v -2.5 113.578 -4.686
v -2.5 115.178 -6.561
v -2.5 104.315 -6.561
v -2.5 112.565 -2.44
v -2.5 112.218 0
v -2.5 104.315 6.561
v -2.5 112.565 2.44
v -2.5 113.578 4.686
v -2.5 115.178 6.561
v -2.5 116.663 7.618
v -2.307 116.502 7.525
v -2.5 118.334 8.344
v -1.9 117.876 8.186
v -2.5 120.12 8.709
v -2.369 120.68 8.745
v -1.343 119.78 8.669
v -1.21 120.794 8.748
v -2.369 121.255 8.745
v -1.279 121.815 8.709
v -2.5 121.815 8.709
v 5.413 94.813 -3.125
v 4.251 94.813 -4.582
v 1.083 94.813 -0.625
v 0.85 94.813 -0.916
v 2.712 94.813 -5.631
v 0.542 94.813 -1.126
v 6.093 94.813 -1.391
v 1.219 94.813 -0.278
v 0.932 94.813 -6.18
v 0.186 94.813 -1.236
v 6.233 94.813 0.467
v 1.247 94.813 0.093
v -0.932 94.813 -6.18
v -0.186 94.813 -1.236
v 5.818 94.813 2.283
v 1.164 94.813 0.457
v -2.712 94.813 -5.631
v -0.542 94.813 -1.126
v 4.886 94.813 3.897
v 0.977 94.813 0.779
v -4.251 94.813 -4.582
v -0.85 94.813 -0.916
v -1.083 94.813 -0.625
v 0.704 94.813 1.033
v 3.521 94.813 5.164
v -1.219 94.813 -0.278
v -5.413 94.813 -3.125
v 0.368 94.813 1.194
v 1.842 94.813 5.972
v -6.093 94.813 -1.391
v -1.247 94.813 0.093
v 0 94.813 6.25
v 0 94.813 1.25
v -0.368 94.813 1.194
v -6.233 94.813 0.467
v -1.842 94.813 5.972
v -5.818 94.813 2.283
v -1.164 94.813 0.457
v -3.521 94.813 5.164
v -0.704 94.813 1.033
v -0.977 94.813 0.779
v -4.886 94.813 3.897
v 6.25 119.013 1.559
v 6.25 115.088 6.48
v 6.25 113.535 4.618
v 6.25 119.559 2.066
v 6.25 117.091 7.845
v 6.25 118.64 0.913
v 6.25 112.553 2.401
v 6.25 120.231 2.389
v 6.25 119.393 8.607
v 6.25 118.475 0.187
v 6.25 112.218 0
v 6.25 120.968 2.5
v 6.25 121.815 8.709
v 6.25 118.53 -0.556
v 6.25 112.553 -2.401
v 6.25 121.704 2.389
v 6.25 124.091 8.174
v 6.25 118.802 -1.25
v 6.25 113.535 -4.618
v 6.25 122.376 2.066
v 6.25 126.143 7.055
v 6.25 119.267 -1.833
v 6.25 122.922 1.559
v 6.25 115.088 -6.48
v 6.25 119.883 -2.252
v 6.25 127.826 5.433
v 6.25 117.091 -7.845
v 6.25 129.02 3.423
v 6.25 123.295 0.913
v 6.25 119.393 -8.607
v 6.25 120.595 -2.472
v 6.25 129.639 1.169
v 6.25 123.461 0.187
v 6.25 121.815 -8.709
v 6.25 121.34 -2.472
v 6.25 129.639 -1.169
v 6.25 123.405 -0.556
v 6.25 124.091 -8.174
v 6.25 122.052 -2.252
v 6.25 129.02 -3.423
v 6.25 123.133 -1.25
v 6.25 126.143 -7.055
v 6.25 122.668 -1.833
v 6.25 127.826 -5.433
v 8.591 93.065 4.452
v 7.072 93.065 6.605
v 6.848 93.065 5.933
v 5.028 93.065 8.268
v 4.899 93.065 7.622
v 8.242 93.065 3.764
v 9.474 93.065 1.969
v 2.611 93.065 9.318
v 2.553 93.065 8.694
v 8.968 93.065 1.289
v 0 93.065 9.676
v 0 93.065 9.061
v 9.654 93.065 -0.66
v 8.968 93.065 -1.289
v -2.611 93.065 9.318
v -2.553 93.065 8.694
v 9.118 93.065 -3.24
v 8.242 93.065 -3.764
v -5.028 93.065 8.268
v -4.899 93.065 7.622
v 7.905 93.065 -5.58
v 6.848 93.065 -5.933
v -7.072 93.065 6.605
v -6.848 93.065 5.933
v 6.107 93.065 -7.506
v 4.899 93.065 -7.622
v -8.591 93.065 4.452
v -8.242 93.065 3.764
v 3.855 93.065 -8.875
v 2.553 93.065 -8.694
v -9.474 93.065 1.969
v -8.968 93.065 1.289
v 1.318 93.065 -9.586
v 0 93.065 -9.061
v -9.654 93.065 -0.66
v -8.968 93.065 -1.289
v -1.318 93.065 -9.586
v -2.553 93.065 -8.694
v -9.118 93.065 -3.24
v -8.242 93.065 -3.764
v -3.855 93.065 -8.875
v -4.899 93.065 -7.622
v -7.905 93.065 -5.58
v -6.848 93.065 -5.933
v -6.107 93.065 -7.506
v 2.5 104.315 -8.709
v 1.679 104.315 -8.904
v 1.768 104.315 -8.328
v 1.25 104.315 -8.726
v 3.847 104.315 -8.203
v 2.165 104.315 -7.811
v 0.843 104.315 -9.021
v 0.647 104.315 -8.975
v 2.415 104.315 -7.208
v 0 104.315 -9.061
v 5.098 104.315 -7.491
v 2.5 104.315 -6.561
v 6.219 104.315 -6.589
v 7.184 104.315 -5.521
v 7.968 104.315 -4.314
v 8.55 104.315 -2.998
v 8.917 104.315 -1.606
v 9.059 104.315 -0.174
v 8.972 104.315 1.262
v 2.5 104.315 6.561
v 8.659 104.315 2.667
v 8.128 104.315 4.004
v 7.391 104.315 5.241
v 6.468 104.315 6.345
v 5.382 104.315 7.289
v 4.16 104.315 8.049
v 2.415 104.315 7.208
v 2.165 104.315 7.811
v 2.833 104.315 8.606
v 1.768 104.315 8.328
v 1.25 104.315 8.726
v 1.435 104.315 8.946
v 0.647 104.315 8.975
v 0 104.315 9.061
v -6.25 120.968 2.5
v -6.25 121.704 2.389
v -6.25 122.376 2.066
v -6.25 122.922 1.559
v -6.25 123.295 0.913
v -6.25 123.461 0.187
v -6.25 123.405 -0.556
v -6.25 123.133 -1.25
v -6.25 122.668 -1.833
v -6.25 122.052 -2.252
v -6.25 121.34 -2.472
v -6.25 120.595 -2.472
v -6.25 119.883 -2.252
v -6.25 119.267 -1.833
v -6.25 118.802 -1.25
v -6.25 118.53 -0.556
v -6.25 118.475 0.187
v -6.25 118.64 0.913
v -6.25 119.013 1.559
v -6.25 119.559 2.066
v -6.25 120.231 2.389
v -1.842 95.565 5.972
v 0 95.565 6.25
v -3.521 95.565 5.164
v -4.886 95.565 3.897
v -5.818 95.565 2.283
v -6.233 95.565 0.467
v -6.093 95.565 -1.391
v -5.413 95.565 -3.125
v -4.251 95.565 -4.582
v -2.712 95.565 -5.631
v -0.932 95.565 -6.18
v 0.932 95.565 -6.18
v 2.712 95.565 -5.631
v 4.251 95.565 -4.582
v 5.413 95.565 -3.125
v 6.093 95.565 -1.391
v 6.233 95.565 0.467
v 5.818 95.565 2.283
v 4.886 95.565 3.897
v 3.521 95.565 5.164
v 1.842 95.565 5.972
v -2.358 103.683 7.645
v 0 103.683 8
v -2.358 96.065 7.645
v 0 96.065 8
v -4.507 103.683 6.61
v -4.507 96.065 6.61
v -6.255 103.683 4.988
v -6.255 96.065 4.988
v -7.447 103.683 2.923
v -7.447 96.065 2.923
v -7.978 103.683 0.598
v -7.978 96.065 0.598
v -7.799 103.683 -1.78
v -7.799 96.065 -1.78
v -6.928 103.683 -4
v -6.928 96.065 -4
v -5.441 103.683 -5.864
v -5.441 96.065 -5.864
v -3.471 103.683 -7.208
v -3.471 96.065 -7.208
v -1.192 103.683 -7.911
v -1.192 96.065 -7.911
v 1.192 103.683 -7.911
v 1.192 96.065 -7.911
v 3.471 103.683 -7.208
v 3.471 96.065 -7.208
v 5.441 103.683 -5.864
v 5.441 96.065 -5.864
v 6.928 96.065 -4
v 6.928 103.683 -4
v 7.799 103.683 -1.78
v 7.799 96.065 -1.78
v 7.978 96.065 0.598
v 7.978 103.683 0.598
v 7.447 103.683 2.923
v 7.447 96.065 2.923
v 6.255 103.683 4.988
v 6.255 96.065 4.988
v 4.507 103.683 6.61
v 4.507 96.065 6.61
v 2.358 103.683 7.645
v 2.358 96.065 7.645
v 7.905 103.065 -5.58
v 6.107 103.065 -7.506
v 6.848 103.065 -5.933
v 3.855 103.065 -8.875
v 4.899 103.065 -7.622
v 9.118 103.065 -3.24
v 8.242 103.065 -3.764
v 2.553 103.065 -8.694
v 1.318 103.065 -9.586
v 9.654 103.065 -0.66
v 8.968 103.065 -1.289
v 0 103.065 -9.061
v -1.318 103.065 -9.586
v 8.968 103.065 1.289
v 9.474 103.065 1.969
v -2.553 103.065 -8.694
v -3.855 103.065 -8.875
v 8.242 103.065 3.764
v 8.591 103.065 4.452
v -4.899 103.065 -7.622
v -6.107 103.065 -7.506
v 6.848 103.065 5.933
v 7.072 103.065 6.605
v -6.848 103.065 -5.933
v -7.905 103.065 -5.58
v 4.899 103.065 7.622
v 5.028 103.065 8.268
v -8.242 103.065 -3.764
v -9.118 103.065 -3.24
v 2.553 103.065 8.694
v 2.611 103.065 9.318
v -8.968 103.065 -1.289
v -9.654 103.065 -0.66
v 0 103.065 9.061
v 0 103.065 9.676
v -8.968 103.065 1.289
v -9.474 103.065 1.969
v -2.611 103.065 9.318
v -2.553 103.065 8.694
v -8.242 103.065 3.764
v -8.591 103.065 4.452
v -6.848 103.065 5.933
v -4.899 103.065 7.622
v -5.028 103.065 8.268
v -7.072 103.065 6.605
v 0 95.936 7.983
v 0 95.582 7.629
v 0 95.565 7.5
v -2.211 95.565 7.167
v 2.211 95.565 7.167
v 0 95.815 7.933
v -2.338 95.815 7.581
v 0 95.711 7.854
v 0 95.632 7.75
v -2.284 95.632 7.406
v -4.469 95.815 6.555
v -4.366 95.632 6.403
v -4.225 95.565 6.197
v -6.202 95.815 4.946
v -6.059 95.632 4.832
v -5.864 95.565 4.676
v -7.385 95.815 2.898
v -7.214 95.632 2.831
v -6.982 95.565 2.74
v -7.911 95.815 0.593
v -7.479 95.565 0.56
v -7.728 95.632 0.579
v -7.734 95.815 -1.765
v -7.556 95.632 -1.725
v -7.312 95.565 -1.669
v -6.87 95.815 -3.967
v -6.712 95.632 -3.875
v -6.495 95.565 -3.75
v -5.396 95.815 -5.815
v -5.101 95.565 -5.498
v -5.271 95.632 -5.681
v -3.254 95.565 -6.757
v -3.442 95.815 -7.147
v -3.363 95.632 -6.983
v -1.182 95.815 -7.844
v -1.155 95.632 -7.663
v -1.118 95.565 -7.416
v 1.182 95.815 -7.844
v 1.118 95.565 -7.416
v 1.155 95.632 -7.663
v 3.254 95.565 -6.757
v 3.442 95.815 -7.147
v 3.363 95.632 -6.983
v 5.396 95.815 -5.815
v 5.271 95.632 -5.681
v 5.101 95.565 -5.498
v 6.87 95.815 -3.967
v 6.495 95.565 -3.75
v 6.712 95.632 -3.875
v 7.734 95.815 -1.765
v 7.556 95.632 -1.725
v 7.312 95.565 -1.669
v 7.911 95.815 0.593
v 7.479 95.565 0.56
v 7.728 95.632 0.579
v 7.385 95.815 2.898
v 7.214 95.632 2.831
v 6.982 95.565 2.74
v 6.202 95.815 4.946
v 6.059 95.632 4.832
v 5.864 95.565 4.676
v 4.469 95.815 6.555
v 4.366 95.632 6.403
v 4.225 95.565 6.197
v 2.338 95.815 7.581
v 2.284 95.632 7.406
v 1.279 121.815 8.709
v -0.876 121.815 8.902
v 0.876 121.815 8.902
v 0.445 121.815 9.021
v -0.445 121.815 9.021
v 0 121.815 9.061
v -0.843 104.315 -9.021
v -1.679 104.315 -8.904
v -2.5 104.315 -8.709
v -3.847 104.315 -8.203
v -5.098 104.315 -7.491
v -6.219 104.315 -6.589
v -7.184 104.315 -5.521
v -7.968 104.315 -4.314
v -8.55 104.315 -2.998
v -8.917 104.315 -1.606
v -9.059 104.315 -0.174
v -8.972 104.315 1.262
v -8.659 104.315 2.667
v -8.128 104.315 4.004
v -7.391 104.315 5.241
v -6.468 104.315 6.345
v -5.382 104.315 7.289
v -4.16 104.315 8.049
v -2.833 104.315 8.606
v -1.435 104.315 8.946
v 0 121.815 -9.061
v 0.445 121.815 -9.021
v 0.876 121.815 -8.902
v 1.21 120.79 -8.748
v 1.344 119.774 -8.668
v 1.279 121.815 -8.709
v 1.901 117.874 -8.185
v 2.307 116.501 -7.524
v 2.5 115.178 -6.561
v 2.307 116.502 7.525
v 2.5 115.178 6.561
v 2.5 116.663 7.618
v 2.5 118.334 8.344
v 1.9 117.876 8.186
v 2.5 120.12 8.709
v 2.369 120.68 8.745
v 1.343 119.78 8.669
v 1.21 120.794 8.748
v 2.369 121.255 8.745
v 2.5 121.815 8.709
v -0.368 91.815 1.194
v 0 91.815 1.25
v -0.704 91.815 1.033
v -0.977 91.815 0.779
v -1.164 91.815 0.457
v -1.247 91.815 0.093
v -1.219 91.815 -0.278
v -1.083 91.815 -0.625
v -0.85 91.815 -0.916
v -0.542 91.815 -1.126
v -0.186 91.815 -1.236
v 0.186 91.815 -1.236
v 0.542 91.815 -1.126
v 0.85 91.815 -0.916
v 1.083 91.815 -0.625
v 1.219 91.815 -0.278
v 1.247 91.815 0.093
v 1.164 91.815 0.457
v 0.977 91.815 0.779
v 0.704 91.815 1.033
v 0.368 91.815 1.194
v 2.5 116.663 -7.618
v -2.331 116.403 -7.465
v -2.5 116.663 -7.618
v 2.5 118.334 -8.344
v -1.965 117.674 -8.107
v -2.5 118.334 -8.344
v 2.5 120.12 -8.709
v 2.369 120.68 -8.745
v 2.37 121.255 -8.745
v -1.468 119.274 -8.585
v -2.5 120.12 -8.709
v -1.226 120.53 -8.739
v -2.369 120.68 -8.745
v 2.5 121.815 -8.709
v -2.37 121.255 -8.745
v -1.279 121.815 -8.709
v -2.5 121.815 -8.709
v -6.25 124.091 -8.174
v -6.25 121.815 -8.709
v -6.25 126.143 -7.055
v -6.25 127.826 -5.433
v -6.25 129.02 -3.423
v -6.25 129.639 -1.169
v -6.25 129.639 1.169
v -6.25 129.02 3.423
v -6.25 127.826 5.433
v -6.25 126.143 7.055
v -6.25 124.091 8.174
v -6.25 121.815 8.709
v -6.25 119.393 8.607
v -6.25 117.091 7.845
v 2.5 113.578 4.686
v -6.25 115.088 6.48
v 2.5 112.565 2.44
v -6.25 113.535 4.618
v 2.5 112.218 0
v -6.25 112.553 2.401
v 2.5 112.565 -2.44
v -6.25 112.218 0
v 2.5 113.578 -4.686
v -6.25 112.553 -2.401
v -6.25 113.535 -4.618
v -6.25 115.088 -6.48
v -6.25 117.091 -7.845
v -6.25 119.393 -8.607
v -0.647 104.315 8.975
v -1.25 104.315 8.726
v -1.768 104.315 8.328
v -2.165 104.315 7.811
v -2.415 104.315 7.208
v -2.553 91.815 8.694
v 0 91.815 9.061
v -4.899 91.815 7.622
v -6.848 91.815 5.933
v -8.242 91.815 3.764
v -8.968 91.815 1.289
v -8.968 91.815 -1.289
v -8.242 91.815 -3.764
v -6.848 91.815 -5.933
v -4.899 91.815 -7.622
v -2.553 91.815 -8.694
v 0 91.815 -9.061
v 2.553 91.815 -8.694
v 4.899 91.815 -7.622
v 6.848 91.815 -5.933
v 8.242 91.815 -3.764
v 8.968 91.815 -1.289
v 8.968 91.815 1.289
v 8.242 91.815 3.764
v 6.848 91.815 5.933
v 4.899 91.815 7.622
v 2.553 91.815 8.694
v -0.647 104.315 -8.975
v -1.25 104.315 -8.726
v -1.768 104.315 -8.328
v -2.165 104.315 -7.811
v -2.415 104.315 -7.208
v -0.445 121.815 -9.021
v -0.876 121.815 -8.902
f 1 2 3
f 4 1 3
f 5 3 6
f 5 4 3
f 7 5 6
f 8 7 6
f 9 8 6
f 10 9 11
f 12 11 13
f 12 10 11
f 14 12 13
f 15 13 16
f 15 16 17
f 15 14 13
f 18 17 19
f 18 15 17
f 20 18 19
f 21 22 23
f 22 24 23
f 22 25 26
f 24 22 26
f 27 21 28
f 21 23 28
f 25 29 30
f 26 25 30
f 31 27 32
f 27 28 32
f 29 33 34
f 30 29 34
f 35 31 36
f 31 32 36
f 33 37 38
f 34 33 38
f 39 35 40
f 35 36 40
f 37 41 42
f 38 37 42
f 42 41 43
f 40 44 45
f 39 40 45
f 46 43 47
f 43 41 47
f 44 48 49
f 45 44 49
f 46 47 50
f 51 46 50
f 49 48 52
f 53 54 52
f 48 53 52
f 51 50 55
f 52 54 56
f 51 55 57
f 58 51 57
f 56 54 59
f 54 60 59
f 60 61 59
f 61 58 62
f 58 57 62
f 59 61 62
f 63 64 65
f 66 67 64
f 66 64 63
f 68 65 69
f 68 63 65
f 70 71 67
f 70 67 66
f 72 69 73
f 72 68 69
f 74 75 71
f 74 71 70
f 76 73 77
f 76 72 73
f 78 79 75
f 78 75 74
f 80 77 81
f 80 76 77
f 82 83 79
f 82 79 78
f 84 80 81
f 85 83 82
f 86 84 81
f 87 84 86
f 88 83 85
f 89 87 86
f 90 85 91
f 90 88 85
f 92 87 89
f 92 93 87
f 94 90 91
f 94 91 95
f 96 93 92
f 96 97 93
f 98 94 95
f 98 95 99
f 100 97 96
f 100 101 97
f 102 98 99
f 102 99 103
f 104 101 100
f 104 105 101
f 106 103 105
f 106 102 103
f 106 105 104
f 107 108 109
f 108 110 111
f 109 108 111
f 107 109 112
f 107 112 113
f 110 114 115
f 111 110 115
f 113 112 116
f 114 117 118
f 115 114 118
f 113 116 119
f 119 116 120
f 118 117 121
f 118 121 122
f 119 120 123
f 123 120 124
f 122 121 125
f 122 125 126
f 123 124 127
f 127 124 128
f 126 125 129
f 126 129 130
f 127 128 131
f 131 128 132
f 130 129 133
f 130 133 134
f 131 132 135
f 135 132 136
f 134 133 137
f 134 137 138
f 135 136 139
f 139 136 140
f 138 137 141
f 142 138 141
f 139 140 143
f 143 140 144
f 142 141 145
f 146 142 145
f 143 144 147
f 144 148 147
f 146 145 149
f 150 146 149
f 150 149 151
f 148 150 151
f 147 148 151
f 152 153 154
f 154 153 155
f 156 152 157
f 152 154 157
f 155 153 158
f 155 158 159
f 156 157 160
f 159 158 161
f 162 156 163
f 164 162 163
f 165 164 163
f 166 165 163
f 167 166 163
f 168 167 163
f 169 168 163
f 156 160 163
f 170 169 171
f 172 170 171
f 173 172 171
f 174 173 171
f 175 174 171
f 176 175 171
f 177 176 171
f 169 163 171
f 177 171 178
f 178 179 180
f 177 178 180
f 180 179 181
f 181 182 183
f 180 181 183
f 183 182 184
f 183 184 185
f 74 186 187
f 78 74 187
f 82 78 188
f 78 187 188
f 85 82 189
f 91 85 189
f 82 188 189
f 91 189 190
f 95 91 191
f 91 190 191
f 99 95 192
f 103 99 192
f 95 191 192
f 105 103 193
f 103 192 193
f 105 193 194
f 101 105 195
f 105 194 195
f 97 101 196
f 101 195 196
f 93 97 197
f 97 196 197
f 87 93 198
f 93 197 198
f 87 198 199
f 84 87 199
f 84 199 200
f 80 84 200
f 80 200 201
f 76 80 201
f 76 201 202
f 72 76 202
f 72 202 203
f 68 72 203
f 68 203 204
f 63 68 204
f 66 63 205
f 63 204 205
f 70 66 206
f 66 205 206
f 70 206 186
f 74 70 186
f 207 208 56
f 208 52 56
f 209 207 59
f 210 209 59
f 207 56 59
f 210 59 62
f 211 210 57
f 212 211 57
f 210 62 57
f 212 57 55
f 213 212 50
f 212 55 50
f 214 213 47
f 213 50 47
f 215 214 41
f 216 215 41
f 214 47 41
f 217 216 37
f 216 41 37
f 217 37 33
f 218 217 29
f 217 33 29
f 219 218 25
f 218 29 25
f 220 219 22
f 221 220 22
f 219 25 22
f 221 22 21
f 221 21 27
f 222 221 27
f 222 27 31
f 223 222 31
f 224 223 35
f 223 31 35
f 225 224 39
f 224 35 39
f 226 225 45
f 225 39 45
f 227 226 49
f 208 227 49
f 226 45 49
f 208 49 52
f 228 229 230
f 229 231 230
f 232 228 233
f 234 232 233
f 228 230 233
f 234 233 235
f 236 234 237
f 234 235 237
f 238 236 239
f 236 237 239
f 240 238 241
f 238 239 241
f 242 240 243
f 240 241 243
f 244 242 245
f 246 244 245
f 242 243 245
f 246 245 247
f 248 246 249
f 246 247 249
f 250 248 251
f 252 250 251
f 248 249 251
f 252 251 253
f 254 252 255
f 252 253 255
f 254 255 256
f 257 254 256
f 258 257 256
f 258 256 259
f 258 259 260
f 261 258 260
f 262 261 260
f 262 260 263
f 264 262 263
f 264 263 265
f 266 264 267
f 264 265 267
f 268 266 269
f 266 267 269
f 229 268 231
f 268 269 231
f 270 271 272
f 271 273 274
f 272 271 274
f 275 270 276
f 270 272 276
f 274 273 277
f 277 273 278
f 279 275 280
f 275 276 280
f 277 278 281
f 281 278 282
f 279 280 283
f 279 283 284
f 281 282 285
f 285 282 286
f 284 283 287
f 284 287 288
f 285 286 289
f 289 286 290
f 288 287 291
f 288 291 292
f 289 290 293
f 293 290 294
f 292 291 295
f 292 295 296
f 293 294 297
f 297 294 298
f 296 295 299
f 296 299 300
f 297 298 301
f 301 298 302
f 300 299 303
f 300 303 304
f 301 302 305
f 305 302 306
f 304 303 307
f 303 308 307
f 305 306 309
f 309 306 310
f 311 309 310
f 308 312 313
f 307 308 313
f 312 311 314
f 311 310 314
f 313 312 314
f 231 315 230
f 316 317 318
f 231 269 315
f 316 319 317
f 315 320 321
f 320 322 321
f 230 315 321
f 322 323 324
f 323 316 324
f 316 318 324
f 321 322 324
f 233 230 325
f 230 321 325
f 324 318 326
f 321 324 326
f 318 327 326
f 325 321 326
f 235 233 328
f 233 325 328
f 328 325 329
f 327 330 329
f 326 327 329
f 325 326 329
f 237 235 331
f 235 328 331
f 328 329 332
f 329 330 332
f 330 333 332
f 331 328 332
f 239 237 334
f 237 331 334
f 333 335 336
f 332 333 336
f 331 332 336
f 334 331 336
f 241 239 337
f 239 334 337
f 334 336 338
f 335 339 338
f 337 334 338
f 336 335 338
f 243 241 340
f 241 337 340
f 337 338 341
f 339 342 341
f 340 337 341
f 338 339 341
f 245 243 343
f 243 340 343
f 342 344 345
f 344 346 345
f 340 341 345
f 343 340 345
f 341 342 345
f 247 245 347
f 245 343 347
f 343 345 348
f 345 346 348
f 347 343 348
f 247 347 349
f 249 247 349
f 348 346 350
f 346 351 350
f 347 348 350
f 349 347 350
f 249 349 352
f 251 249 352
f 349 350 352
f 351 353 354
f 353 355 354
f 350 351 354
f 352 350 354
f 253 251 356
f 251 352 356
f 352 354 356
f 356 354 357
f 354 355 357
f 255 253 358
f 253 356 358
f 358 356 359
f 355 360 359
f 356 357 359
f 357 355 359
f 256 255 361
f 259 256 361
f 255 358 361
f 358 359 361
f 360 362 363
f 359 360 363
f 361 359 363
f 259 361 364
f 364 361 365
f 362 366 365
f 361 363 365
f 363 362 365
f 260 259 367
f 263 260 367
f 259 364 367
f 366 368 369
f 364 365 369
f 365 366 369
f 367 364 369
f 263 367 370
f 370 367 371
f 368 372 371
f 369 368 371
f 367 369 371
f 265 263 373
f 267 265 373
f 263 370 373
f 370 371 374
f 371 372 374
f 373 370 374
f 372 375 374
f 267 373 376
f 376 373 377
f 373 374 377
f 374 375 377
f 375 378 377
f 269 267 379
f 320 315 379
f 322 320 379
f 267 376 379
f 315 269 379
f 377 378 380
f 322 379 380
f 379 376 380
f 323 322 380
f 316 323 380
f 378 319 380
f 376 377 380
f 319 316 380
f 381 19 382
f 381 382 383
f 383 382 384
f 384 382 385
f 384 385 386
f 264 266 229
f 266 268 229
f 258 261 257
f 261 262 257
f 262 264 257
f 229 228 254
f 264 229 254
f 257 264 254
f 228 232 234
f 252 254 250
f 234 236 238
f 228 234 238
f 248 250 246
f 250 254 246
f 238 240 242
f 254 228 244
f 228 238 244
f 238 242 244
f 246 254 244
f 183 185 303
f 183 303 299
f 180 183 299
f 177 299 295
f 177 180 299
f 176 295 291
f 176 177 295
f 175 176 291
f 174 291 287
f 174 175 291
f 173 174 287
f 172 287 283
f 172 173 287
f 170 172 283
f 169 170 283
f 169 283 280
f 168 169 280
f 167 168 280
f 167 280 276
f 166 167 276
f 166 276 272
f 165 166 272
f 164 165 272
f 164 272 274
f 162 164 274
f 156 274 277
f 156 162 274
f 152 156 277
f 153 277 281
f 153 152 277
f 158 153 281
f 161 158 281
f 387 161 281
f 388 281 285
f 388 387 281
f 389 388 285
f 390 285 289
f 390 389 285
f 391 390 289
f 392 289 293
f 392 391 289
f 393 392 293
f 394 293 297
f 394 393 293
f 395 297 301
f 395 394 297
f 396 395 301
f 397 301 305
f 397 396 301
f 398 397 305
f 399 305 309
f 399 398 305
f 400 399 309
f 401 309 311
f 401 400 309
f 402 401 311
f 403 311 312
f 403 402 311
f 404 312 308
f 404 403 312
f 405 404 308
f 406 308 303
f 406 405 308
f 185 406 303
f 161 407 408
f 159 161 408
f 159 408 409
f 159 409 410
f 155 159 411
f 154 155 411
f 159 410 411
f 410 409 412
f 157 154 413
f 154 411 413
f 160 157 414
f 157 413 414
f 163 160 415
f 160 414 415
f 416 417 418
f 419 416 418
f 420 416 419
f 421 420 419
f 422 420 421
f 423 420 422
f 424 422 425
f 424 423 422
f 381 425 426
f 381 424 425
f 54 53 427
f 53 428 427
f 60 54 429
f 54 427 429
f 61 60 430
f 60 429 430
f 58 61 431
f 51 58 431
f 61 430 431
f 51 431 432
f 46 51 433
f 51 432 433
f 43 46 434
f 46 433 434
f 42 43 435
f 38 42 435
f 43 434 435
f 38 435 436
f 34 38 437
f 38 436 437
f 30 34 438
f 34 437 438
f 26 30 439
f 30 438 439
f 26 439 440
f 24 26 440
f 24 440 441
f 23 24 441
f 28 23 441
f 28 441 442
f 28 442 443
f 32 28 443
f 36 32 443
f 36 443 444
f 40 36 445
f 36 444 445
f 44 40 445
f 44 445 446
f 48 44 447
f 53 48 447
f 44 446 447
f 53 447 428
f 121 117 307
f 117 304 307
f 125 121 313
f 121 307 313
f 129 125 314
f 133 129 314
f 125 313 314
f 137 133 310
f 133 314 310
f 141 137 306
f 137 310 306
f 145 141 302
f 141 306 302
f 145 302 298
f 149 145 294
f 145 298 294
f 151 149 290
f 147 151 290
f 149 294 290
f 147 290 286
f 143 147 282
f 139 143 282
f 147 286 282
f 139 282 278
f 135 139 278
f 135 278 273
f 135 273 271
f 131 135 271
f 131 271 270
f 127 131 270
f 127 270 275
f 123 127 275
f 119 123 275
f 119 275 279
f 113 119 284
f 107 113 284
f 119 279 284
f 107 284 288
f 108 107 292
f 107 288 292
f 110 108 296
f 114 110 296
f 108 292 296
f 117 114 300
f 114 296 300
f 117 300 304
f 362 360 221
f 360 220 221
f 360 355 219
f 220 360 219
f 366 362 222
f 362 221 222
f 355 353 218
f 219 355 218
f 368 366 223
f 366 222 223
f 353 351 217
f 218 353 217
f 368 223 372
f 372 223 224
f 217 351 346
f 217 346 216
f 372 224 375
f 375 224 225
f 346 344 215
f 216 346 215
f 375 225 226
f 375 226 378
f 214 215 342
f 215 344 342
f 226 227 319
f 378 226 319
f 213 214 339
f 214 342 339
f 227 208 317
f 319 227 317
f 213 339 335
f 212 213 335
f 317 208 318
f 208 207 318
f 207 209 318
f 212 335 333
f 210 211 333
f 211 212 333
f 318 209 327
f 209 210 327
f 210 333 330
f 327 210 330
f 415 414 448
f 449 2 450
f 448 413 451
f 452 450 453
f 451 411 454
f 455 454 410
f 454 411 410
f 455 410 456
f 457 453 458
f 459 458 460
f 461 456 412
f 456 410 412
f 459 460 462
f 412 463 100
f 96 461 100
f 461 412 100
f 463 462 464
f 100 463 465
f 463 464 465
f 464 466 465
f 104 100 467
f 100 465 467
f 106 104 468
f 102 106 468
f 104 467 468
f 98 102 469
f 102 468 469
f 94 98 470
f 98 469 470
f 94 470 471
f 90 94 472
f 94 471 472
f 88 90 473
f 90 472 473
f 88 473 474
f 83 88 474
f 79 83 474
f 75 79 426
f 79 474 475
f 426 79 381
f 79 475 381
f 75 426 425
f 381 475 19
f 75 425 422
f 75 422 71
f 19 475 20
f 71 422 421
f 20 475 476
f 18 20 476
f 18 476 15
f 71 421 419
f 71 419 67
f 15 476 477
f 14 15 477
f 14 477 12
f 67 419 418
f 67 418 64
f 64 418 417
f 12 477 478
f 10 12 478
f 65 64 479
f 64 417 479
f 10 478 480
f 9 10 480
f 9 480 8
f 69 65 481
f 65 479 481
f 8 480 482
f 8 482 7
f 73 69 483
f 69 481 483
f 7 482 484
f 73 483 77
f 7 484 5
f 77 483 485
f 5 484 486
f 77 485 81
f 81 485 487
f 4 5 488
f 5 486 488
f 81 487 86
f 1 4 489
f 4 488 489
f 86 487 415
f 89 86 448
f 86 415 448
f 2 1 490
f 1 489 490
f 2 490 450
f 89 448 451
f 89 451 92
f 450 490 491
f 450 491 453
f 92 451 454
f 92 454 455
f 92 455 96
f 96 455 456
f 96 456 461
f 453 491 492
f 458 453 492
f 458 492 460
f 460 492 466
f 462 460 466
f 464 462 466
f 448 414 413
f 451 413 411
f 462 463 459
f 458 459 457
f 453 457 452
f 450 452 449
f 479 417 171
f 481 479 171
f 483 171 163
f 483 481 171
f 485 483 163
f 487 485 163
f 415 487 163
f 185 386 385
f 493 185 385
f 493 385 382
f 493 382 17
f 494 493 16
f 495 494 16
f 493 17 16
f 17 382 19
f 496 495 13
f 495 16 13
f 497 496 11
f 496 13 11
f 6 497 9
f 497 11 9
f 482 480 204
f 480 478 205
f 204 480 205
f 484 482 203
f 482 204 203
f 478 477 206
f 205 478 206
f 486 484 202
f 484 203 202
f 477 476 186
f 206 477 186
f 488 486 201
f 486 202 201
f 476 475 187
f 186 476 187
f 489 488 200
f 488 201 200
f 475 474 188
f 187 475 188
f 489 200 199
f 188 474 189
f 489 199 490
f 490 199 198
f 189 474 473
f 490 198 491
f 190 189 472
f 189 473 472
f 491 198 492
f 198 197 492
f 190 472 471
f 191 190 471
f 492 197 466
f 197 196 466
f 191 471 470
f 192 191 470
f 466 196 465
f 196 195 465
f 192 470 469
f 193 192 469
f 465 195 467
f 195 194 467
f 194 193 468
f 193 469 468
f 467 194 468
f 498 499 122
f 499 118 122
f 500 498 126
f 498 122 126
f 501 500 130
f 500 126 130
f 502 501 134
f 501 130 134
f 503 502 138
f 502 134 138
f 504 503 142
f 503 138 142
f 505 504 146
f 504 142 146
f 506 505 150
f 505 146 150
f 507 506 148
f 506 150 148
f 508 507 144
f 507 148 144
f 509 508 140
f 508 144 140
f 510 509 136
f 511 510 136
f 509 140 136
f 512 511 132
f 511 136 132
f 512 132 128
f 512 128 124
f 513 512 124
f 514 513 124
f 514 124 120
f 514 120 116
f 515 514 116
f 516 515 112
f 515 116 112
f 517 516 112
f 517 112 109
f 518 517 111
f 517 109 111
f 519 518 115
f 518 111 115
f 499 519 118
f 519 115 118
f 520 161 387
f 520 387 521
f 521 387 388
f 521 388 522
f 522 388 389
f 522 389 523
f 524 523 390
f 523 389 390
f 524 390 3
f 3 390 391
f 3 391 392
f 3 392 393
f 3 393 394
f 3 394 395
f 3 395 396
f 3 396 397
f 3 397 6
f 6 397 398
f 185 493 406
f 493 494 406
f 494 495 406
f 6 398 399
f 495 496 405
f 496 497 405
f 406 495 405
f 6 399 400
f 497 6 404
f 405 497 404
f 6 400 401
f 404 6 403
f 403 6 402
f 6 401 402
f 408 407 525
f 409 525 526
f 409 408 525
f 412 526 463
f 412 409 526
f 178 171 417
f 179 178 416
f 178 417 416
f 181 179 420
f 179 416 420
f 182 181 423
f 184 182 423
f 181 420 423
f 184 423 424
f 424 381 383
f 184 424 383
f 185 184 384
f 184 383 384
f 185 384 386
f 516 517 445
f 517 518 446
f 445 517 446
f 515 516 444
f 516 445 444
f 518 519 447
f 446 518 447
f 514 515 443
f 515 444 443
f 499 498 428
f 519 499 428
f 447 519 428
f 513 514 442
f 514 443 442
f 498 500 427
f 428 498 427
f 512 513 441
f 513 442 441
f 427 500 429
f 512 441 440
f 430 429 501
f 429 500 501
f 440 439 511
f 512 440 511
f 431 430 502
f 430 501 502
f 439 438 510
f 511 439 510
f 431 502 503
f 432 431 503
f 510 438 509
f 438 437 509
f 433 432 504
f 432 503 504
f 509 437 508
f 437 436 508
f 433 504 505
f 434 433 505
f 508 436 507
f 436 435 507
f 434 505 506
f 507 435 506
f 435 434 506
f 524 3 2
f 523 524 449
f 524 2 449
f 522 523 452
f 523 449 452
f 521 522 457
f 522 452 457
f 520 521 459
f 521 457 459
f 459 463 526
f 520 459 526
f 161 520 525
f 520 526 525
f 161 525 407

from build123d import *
from build123d.topology import SkipClean

# Parameters (mm, degrees)
BOSS_EXTRU_1_START      = 70
BOSS_EXTRU_1_DEPTH      = 70
BOSS_EXTRU_2_DEPTH      = 25
ESQUISSE7_R             = 10
ENL_V_MAT_EXTRU_1_DEPTH = 50
CONG_3_R                = 10
ECHELLE1_SCALE          = 0.25


with BuildPart() as part:
    # Esquisse1 → Révolution1 (revolve)
    with BuildSketch(Plane.XY, mode=Mode.PRIVATE) as r_volution1_sk:
        with BuildLine():
            Line((-5, 34.242293075), (-36.242368939, 34.242293075))
            Line((-36.242368939, 34.242293075), (-36.242368939, 39.242293075))
            Line((-36.242368939, 39.242293075), (-38.705375435, 39.242293075))
            Line((-38.705375435, 39.242293075), (-38.705375435, 79.242293075))
            Line((-38.705375435, 79.242293075), (-36.242368939, 79.242293075))
            Line((-36.242368939, 79.242293075), (-36.242368939, 84.242293075))
            Line((-36.242368939, 84.242293075), (-32, 84.242293075))
            Line((-32, 84.242293075), (0, 84.242293075))
            Line((0, 84.242293075), (0, 81.713773078))
            Line((0, 81.713773078), (-32, 81.713773078))
            Line((-32, 81.713773078), (-32, 51.242293075))
            ThreePointArc((-32, 51.242293075), (-31.414213562, 49.828079513), (-30, 49.242293075))
            Line((-30, 49.242293075), (-25, 49.242293075))
            Line((-25, 49.242293075), (-25, 46.233820065))
            Line((-25, 46.233820065), (-5, 46.233820065))
            Line((-5, 46.233820065), (-5, 34.242293075))
        make_face()
    revolve(r_volution1_sk.sketch.rotate(Axis((0, 190.222222222, 0), (0, -1, 0)), 270), axis=Axis((0, 190.222222222, 0), (0, -1, 0)))

    # Esquisse2 → Boss.-Extru.1 (add)
    with SkipClean():  # the faces are left unmerged after this step: merging them gives an invalid solid
        with BuildSketch(Plane(origin=(0, 84.242293075, 0), x_dir=(1, 0, 0), z_dir=(0, 1, 0)).offset(BOSS_EXTRU_1_START)):
            with BuildLine():
                Line((-10, 34.835460472), (-10, -34.835460472))
                ThreePointArc((-10, -34.835460472), (0, -36.242368939), (10, -34.835460472))
                Line((10, -34.835460472), (10, 34.835460472))
                ThreePointArc((10, 34.835460472), (0, 36.242368939), (-10, 34.835460472))
            make_face()
        extrude(amount=-BOSS_EXTRU_1_DEPTH)

    # Esquisse6 → Boss.-Extru.2 (add, symmetric)
    with SkipClean():  # the faces are left unmerged after this step: merging them gives an invalid solid
        with BuildSketch(Plane.ZY):
            with BuildLine():
                ThreePointArc((-34.835460472, 154.242293075), (0, 185.852500498), (34.835460472, 154.242293075))
                ThreePointArc((34.835460472, 154.242293075), (0, 115.852500498), (-34.835460472, 154.242293075))
            make_face()
        extrude(amount=BOSS_EXTRU_2_DEPTH, both=True)

    # Esquisse7 → Enlèv. mat.-Extru.1 (cut)
    with SkipClean():  # the faces are left unmerged after this step: merging them gives an invalid solid
        with BuildSketch(Plane.ZY.offset(25)):
            with Locations((0, 150.852500498)):
                Circle(ESQUISSE7_R)
        extrude(amount=-ENL_V_MAT_EXTRU_1_DEPTH, mode=Mode.SUBTRACT)

    # Congé3
    # the kernel refuses this fillet: 10 mm, written as the material it takes off along each edge
    with BuildSketch(Plane(origin=(10, 172.708919448, 34.835460472), x_dir=(-0.9902475852004595, 0, 0.1393187711855749), z_dir=(0, -1, 0))) as cong_3_piece_1_section:
        with BuildLine():
            CenterArc((8.705296899, 9.902475852), CONG_3_R, 188.0084284, 90)
            Line((-1.197178953, 8.50928814), (0, 0))
            ThreePointArc((0, 0), (5.049242305, -0.353450615), (10.098484611, 0))
        make_face()
    cong_3_piece_1 = extrude(amount=88.466626373, mode=Mode.PRIVATE)
    cong_3_piece_1 = cong_3_piece_1 - Plane(origin=(7.456754733, 150.852500498, 0), x_dir=(0, 0.09685121648897653, -0.9952988706235959), z_dir=(-1, 0, 0)) * Cylinder(35, 218, mode=Mode.PRIVATE)
    add(cong_3_piece_1, mode=Mode.SUBTRACT)
    with BuildSketch(Plane(origin=(10, 172.708919448, -34.835460472), x_dir=(-0.9902475852004589, 0, -0.13931877118558042), z_dir=(0, -1, 0))) as cong_3_piece_2_section:
        with BuildLine():
            CenterArc((8.705296899, -9.902475852), CONG_3_R, 81.9915716, 90)
            Line((-1.197178953, -8.50928814), (0, 0))
            ThreePointArc((0, 0), (5.049242305, 0.353450615), (10.098484611, 0))
        make_face()
    cong_3_piece_2 = extrude(amount=88.466626373, mode=Mode.PRIVATE)
    cong_3_piece_2 = cong_3_piece_2 - Plane(origin=(7.456771832, 150.852500498, 0), x_dir=(0, 0.09685121648897653, -0.9952988706235959), z_dir=(-1, 0, 0)) * Cylinder(35, 218, mode=Mode.PRIVATE)
    add(cong_3_piece_2, mode=Mode.SUBTRACT)
    with BuildSketch(Plane(origin=(-10, 172.708919448, -34.835460472), x_dir=(0.990247585200459, 0, -0.13931877118557906), z_dir=(0, -1, 0))) as cong_3_piece_3_section:
        with BuildLine():
            CenterArc((8.705296899, 9.902475852), CONG_3_R, 188.0084284, 90)
            Line((-1.197178953, 8.50928814), (0, 0))
            ThreePointArc((0, 0), (5.049242305, -0.353450615), (10.098484611, 0))
        make_face()
    cong_3_piece_3 = extrude(amount=88.466626373, mode=Mode.PRIVATE)
    cong_3_piece_3 = cong_3_piece_3 - Plane(origin=(-7.456771832, 150.852500498, 0), x_dir=(0, 0.09685121648897653, -0.9952988706235959), z_dir=(-1, 0, 0)) * Cylinder(35, 218, mode=Mode.PRIVATE)
    add(cong_3_piece_3, mode=Mode.SUBTRACT)
    with BuildSketch(Plane(origin=(-10, 172.708919448, 34.835460472), x_dir=(0.9902475852004595, 0, 0.1393187711855749), z_dir=(0, -1, 0))) as cong_3_piece_4_section:
        with BuildLine():
            CenterArc((8.705296899, -9.902475852), CONG_3_R, 81.9915716, 90)
            Line((-1.197178953, -8.50928814), (0, 0))
            ThreePointArc((0, 0), (5.049242305, 0.353450615), (10.098484611, 0))
        make_face()
    cong_3_piece_4 = extrude(amount=88.466626373, mode=Mode.PRIVATE)
    cong_3_piece_4 = cong_3_piece_4 - Plane(origin=(-7.456754733, 150.852500498, 0), x_dir=(0, 0.09685121648897653, -0.9952988706235959), z_dir=(-1, 0, 0)) * Cylinder(35, 218, mode=Mode.PRIVATE)
    add(cong_3_piece_4, mode=Mode.SUBTRACT)


with BuildPart() as part_1:
    # Echelle1: scaled about (0, 111.005849146, 2.25e-07)
    add(part.part.scale(ECHELLE1_SCALE).moved(Location((0, 83.25438686, 1.69e-07))))


solid = part_1.part
